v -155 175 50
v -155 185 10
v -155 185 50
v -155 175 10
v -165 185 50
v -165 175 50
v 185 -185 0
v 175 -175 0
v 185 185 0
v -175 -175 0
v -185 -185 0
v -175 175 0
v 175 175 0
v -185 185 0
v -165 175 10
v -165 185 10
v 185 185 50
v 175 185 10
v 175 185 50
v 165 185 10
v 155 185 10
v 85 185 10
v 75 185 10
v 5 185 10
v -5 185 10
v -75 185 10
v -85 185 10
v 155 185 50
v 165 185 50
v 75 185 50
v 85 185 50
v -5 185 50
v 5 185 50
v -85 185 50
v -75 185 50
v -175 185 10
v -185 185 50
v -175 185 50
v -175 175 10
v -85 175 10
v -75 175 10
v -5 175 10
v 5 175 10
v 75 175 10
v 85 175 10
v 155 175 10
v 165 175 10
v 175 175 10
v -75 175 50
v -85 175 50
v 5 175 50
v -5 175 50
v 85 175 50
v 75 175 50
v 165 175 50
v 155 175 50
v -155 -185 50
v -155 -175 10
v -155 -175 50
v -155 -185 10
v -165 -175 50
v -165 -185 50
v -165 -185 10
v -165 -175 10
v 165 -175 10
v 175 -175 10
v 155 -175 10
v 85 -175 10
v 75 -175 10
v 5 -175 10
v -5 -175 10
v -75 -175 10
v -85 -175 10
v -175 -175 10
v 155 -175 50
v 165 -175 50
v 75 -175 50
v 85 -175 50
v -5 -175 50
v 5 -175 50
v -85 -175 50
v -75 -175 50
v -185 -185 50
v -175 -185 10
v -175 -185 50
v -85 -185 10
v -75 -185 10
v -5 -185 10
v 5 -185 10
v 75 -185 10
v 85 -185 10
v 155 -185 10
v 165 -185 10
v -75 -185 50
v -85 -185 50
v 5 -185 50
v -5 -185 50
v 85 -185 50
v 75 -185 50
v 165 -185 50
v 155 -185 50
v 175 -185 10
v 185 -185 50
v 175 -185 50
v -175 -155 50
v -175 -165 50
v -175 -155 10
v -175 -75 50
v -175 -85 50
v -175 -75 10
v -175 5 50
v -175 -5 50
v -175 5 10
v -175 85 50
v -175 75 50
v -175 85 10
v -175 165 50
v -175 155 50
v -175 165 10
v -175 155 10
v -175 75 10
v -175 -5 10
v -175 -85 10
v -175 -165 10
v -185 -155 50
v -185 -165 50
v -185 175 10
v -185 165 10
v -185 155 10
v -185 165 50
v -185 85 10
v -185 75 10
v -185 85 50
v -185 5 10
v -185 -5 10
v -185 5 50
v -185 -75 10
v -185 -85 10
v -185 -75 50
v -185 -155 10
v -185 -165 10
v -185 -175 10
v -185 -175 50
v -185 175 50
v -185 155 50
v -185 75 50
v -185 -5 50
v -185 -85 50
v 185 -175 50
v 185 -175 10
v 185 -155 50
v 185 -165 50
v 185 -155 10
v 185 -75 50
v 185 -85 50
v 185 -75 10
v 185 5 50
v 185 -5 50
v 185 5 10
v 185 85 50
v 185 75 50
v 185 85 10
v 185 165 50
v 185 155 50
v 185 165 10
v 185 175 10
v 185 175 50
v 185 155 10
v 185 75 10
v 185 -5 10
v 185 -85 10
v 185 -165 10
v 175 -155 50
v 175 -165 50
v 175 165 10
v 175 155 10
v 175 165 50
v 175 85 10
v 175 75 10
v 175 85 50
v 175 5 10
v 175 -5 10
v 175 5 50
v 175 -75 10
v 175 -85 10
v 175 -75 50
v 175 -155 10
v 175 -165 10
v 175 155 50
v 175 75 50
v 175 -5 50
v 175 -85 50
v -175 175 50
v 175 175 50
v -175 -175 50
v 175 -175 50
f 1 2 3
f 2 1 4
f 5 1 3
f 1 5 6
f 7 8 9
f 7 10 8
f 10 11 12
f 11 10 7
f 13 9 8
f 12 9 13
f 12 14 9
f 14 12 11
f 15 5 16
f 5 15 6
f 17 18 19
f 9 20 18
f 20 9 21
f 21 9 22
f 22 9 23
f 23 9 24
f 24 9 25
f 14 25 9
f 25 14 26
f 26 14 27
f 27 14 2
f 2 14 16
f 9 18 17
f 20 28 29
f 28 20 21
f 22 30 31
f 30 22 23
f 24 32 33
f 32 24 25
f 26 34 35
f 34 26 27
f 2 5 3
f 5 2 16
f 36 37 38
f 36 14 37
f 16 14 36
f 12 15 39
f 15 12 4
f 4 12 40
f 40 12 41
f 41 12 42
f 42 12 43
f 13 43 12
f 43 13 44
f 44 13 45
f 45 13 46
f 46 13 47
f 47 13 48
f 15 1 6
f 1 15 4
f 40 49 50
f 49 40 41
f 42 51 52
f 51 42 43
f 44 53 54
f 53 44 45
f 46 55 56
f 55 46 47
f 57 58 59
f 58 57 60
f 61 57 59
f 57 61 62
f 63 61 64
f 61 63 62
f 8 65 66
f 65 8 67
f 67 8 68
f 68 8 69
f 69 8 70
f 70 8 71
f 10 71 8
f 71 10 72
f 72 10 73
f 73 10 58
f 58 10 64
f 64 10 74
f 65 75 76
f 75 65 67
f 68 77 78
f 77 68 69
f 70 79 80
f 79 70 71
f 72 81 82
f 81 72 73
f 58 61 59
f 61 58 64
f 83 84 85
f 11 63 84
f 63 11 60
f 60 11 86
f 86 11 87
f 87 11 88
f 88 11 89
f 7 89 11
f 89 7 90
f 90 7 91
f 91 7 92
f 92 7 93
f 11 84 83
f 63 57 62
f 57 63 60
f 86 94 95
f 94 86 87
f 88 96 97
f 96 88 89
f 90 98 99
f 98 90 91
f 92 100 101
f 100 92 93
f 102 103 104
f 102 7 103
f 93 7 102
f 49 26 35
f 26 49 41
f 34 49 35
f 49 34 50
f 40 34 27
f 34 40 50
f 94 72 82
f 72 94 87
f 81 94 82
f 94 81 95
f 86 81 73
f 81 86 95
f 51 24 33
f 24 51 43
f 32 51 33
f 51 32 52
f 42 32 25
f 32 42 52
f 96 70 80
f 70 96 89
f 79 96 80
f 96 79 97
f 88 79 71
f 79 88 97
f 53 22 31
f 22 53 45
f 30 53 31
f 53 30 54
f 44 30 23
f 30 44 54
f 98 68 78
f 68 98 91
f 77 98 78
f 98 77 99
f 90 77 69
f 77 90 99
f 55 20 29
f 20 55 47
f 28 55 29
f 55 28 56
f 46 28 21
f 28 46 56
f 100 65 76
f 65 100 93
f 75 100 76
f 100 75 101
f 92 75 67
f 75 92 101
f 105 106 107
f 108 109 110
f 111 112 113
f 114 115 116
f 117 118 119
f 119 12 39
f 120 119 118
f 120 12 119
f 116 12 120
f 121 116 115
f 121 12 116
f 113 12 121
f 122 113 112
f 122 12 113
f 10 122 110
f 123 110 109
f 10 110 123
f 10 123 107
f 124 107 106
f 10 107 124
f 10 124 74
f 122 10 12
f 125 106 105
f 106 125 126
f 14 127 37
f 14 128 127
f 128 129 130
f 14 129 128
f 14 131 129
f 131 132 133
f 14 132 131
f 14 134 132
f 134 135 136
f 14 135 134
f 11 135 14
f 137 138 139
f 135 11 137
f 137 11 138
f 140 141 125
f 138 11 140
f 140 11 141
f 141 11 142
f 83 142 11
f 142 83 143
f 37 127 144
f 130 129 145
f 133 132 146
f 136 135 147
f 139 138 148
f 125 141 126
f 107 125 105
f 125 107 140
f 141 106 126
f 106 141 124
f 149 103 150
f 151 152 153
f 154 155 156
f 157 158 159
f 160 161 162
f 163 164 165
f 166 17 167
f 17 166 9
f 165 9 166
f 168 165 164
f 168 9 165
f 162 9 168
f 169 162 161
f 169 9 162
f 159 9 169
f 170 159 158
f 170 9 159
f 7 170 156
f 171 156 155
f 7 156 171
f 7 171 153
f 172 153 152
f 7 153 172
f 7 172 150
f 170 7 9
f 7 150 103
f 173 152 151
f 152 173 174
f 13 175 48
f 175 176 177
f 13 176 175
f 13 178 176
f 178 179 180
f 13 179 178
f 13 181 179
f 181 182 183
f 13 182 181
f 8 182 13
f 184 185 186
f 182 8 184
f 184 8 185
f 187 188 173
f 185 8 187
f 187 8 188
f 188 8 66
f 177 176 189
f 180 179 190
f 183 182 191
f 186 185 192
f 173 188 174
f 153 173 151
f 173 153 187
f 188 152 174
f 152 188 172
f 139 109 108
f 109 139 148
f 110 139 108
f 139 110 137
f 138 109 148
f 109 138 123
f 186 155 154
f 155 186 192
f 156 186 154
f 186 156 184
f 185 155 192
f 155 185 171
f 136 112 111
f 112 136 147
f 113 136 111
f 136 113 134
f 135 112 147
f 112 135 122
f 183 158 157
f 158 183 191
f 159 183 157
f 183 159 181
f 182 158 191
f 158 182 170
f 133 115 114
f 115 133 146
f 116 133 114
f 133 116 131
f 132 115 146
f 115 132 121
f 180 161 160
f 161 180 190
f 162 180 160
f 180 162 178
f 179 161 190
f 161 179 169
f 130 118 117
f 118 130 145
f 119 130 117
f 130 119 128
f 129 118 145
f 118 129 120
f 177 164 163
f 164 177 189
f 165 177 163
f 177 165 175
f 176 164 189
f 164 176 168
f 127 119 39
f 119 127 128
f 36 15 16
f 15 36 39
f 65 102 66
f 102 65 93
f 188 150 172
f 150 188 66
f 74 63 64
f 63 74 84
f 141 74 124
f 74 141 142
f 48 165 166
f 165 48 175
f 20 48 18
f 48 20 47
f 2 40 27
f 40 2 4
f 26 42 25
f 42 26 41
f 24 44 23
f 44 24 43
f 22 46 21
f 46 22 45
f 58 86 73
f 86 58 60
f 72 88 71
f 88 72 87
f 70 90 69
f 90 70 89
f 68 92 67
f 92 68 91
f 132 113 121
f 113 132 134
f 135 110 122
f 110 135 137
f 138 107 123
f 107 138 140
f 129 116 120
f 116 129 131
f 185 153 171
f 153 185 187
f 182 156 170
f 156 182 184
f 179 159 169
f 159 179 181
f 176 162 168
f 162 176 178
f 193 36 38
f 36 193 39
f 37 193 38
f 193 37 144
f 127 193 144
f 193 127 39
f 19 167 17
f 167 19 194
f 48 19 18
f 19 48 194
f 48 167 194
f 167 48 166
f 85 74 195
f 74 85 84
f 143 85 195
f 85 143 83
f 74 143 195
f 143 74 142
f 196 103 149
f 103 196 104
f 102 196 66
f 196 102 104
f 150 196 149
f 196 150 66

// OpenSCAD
// Cage slice 8
// Internal cavity: 350 x 350 x 700 mm
// Bar thickness: 10 mm (square)
// Gap between bars: 70 mm (uniform)
// Slice index: 8, slice Z range: [400, 450] (local coordinates 0..50)
// This file places the slice with its bottom on Z=0; when assembling, translate in Z by 400 mm.
// Export to STL with OpenSCAD: Render -> Export as STL.

bar = 10;
gap = 70;
s = bar + gap;
$fn = 64;  // cylinder resolution

x_centers = [-160, -80, 0, 80, 160];
y_centers = [-160, -80, 0, 80, 160];
z_centers = [5, 85, 165, 245, 325, 405, 485, 565, 645];

slice_index = 8;
slice_h = 50;

front_y = 180;
back_y = -180;
left_x = -180;
right_x = 180;
panel_length = 370;

hole_diam = 6.6;

module slice() {
    union() {
        // vertical bars on front and back (along Z)
        for (x = x_centers) {
            translate([x, front_y, slice_h/2]) cube([bar, bar, slice_h], center=true);
            translate([x, back_y, slice_h/2])  cube([bar, bar, slice_h], center=true);
        }
        // vertical bars on left and right (along Z)
        for (y = y_centers) {
            translate([left_x, y, slice_h/2])  cube([bar, bar, slice_h], center=true);
            translate([right_x, y, slice_h/2]) cube([bar, bar, slice_h], center=true);
        }
        // explicit corner vertical bars (ensure 4 corners for M6 rods)
        translate([-180, 180, slice_h/2]) cube([bar, bar, slice_h], center=true);
        translate([180, 180, slice_h/2]) cube([bar, bar, slice_h], center=true);
        translate([-180, -180, slice_h/2]) cube([bar, bar, slice_h], center=true);
        translate([180, -180, slice_h/2]) cube([bar, bar, slice_h], center=true);

        // horizontal bars (10 mm thick in Z) that lie inside this slice
        for (zc = z_centers) {
            z_local = zc - slice_index*slice_h;
            // include this horizontal bar if its center lies within this slice and it fits entirely here
            if (z_local >= bar/2 && z_local <= slice_h - bar/2) {
                // front and back horizontal bars (run along X)
                translate([0, front_y, z_local]) cube([panel_length, bar, bar], center=true);
                translate([0, back_y,  z_local]) cube([panel_length, bar, bar], center=true);
                // left and right horizontal bars (run along Y)
                translate([left_x, 0, z_local]) cube([bar, panel_length, bar], center=true);
                translate([right_x,0, z_local]) cube([bar, panel_length, bar], center=true);
            }
        }
    }
}

difference() {
    slice();
    // four vertical holes for M6 rods through corner bars (slightly longer than slice to ensure clean subtraction)
    translate([-180, 180, slice_h/2]) rotate([0,0,0]) cylinder(h = slice_h*4, r = hole_diam/2, center=true);
    translate([180, 180, slice_h/2]) rotate([0,0,0]) cylinder(h = slice_h*4, r = hole_diam/2, center=true);
    translate([-180, -180, slice_h/2]) rotate([0,0,0]) cylinder(h = slice_h*4, r = hole_diam/2, center=true);
    translate([180, -180, slice_h/2]) rotate([0,0,0]) cylinder(h = slice_h*4, r = hole_diam/2, center=true);
}

slice();
